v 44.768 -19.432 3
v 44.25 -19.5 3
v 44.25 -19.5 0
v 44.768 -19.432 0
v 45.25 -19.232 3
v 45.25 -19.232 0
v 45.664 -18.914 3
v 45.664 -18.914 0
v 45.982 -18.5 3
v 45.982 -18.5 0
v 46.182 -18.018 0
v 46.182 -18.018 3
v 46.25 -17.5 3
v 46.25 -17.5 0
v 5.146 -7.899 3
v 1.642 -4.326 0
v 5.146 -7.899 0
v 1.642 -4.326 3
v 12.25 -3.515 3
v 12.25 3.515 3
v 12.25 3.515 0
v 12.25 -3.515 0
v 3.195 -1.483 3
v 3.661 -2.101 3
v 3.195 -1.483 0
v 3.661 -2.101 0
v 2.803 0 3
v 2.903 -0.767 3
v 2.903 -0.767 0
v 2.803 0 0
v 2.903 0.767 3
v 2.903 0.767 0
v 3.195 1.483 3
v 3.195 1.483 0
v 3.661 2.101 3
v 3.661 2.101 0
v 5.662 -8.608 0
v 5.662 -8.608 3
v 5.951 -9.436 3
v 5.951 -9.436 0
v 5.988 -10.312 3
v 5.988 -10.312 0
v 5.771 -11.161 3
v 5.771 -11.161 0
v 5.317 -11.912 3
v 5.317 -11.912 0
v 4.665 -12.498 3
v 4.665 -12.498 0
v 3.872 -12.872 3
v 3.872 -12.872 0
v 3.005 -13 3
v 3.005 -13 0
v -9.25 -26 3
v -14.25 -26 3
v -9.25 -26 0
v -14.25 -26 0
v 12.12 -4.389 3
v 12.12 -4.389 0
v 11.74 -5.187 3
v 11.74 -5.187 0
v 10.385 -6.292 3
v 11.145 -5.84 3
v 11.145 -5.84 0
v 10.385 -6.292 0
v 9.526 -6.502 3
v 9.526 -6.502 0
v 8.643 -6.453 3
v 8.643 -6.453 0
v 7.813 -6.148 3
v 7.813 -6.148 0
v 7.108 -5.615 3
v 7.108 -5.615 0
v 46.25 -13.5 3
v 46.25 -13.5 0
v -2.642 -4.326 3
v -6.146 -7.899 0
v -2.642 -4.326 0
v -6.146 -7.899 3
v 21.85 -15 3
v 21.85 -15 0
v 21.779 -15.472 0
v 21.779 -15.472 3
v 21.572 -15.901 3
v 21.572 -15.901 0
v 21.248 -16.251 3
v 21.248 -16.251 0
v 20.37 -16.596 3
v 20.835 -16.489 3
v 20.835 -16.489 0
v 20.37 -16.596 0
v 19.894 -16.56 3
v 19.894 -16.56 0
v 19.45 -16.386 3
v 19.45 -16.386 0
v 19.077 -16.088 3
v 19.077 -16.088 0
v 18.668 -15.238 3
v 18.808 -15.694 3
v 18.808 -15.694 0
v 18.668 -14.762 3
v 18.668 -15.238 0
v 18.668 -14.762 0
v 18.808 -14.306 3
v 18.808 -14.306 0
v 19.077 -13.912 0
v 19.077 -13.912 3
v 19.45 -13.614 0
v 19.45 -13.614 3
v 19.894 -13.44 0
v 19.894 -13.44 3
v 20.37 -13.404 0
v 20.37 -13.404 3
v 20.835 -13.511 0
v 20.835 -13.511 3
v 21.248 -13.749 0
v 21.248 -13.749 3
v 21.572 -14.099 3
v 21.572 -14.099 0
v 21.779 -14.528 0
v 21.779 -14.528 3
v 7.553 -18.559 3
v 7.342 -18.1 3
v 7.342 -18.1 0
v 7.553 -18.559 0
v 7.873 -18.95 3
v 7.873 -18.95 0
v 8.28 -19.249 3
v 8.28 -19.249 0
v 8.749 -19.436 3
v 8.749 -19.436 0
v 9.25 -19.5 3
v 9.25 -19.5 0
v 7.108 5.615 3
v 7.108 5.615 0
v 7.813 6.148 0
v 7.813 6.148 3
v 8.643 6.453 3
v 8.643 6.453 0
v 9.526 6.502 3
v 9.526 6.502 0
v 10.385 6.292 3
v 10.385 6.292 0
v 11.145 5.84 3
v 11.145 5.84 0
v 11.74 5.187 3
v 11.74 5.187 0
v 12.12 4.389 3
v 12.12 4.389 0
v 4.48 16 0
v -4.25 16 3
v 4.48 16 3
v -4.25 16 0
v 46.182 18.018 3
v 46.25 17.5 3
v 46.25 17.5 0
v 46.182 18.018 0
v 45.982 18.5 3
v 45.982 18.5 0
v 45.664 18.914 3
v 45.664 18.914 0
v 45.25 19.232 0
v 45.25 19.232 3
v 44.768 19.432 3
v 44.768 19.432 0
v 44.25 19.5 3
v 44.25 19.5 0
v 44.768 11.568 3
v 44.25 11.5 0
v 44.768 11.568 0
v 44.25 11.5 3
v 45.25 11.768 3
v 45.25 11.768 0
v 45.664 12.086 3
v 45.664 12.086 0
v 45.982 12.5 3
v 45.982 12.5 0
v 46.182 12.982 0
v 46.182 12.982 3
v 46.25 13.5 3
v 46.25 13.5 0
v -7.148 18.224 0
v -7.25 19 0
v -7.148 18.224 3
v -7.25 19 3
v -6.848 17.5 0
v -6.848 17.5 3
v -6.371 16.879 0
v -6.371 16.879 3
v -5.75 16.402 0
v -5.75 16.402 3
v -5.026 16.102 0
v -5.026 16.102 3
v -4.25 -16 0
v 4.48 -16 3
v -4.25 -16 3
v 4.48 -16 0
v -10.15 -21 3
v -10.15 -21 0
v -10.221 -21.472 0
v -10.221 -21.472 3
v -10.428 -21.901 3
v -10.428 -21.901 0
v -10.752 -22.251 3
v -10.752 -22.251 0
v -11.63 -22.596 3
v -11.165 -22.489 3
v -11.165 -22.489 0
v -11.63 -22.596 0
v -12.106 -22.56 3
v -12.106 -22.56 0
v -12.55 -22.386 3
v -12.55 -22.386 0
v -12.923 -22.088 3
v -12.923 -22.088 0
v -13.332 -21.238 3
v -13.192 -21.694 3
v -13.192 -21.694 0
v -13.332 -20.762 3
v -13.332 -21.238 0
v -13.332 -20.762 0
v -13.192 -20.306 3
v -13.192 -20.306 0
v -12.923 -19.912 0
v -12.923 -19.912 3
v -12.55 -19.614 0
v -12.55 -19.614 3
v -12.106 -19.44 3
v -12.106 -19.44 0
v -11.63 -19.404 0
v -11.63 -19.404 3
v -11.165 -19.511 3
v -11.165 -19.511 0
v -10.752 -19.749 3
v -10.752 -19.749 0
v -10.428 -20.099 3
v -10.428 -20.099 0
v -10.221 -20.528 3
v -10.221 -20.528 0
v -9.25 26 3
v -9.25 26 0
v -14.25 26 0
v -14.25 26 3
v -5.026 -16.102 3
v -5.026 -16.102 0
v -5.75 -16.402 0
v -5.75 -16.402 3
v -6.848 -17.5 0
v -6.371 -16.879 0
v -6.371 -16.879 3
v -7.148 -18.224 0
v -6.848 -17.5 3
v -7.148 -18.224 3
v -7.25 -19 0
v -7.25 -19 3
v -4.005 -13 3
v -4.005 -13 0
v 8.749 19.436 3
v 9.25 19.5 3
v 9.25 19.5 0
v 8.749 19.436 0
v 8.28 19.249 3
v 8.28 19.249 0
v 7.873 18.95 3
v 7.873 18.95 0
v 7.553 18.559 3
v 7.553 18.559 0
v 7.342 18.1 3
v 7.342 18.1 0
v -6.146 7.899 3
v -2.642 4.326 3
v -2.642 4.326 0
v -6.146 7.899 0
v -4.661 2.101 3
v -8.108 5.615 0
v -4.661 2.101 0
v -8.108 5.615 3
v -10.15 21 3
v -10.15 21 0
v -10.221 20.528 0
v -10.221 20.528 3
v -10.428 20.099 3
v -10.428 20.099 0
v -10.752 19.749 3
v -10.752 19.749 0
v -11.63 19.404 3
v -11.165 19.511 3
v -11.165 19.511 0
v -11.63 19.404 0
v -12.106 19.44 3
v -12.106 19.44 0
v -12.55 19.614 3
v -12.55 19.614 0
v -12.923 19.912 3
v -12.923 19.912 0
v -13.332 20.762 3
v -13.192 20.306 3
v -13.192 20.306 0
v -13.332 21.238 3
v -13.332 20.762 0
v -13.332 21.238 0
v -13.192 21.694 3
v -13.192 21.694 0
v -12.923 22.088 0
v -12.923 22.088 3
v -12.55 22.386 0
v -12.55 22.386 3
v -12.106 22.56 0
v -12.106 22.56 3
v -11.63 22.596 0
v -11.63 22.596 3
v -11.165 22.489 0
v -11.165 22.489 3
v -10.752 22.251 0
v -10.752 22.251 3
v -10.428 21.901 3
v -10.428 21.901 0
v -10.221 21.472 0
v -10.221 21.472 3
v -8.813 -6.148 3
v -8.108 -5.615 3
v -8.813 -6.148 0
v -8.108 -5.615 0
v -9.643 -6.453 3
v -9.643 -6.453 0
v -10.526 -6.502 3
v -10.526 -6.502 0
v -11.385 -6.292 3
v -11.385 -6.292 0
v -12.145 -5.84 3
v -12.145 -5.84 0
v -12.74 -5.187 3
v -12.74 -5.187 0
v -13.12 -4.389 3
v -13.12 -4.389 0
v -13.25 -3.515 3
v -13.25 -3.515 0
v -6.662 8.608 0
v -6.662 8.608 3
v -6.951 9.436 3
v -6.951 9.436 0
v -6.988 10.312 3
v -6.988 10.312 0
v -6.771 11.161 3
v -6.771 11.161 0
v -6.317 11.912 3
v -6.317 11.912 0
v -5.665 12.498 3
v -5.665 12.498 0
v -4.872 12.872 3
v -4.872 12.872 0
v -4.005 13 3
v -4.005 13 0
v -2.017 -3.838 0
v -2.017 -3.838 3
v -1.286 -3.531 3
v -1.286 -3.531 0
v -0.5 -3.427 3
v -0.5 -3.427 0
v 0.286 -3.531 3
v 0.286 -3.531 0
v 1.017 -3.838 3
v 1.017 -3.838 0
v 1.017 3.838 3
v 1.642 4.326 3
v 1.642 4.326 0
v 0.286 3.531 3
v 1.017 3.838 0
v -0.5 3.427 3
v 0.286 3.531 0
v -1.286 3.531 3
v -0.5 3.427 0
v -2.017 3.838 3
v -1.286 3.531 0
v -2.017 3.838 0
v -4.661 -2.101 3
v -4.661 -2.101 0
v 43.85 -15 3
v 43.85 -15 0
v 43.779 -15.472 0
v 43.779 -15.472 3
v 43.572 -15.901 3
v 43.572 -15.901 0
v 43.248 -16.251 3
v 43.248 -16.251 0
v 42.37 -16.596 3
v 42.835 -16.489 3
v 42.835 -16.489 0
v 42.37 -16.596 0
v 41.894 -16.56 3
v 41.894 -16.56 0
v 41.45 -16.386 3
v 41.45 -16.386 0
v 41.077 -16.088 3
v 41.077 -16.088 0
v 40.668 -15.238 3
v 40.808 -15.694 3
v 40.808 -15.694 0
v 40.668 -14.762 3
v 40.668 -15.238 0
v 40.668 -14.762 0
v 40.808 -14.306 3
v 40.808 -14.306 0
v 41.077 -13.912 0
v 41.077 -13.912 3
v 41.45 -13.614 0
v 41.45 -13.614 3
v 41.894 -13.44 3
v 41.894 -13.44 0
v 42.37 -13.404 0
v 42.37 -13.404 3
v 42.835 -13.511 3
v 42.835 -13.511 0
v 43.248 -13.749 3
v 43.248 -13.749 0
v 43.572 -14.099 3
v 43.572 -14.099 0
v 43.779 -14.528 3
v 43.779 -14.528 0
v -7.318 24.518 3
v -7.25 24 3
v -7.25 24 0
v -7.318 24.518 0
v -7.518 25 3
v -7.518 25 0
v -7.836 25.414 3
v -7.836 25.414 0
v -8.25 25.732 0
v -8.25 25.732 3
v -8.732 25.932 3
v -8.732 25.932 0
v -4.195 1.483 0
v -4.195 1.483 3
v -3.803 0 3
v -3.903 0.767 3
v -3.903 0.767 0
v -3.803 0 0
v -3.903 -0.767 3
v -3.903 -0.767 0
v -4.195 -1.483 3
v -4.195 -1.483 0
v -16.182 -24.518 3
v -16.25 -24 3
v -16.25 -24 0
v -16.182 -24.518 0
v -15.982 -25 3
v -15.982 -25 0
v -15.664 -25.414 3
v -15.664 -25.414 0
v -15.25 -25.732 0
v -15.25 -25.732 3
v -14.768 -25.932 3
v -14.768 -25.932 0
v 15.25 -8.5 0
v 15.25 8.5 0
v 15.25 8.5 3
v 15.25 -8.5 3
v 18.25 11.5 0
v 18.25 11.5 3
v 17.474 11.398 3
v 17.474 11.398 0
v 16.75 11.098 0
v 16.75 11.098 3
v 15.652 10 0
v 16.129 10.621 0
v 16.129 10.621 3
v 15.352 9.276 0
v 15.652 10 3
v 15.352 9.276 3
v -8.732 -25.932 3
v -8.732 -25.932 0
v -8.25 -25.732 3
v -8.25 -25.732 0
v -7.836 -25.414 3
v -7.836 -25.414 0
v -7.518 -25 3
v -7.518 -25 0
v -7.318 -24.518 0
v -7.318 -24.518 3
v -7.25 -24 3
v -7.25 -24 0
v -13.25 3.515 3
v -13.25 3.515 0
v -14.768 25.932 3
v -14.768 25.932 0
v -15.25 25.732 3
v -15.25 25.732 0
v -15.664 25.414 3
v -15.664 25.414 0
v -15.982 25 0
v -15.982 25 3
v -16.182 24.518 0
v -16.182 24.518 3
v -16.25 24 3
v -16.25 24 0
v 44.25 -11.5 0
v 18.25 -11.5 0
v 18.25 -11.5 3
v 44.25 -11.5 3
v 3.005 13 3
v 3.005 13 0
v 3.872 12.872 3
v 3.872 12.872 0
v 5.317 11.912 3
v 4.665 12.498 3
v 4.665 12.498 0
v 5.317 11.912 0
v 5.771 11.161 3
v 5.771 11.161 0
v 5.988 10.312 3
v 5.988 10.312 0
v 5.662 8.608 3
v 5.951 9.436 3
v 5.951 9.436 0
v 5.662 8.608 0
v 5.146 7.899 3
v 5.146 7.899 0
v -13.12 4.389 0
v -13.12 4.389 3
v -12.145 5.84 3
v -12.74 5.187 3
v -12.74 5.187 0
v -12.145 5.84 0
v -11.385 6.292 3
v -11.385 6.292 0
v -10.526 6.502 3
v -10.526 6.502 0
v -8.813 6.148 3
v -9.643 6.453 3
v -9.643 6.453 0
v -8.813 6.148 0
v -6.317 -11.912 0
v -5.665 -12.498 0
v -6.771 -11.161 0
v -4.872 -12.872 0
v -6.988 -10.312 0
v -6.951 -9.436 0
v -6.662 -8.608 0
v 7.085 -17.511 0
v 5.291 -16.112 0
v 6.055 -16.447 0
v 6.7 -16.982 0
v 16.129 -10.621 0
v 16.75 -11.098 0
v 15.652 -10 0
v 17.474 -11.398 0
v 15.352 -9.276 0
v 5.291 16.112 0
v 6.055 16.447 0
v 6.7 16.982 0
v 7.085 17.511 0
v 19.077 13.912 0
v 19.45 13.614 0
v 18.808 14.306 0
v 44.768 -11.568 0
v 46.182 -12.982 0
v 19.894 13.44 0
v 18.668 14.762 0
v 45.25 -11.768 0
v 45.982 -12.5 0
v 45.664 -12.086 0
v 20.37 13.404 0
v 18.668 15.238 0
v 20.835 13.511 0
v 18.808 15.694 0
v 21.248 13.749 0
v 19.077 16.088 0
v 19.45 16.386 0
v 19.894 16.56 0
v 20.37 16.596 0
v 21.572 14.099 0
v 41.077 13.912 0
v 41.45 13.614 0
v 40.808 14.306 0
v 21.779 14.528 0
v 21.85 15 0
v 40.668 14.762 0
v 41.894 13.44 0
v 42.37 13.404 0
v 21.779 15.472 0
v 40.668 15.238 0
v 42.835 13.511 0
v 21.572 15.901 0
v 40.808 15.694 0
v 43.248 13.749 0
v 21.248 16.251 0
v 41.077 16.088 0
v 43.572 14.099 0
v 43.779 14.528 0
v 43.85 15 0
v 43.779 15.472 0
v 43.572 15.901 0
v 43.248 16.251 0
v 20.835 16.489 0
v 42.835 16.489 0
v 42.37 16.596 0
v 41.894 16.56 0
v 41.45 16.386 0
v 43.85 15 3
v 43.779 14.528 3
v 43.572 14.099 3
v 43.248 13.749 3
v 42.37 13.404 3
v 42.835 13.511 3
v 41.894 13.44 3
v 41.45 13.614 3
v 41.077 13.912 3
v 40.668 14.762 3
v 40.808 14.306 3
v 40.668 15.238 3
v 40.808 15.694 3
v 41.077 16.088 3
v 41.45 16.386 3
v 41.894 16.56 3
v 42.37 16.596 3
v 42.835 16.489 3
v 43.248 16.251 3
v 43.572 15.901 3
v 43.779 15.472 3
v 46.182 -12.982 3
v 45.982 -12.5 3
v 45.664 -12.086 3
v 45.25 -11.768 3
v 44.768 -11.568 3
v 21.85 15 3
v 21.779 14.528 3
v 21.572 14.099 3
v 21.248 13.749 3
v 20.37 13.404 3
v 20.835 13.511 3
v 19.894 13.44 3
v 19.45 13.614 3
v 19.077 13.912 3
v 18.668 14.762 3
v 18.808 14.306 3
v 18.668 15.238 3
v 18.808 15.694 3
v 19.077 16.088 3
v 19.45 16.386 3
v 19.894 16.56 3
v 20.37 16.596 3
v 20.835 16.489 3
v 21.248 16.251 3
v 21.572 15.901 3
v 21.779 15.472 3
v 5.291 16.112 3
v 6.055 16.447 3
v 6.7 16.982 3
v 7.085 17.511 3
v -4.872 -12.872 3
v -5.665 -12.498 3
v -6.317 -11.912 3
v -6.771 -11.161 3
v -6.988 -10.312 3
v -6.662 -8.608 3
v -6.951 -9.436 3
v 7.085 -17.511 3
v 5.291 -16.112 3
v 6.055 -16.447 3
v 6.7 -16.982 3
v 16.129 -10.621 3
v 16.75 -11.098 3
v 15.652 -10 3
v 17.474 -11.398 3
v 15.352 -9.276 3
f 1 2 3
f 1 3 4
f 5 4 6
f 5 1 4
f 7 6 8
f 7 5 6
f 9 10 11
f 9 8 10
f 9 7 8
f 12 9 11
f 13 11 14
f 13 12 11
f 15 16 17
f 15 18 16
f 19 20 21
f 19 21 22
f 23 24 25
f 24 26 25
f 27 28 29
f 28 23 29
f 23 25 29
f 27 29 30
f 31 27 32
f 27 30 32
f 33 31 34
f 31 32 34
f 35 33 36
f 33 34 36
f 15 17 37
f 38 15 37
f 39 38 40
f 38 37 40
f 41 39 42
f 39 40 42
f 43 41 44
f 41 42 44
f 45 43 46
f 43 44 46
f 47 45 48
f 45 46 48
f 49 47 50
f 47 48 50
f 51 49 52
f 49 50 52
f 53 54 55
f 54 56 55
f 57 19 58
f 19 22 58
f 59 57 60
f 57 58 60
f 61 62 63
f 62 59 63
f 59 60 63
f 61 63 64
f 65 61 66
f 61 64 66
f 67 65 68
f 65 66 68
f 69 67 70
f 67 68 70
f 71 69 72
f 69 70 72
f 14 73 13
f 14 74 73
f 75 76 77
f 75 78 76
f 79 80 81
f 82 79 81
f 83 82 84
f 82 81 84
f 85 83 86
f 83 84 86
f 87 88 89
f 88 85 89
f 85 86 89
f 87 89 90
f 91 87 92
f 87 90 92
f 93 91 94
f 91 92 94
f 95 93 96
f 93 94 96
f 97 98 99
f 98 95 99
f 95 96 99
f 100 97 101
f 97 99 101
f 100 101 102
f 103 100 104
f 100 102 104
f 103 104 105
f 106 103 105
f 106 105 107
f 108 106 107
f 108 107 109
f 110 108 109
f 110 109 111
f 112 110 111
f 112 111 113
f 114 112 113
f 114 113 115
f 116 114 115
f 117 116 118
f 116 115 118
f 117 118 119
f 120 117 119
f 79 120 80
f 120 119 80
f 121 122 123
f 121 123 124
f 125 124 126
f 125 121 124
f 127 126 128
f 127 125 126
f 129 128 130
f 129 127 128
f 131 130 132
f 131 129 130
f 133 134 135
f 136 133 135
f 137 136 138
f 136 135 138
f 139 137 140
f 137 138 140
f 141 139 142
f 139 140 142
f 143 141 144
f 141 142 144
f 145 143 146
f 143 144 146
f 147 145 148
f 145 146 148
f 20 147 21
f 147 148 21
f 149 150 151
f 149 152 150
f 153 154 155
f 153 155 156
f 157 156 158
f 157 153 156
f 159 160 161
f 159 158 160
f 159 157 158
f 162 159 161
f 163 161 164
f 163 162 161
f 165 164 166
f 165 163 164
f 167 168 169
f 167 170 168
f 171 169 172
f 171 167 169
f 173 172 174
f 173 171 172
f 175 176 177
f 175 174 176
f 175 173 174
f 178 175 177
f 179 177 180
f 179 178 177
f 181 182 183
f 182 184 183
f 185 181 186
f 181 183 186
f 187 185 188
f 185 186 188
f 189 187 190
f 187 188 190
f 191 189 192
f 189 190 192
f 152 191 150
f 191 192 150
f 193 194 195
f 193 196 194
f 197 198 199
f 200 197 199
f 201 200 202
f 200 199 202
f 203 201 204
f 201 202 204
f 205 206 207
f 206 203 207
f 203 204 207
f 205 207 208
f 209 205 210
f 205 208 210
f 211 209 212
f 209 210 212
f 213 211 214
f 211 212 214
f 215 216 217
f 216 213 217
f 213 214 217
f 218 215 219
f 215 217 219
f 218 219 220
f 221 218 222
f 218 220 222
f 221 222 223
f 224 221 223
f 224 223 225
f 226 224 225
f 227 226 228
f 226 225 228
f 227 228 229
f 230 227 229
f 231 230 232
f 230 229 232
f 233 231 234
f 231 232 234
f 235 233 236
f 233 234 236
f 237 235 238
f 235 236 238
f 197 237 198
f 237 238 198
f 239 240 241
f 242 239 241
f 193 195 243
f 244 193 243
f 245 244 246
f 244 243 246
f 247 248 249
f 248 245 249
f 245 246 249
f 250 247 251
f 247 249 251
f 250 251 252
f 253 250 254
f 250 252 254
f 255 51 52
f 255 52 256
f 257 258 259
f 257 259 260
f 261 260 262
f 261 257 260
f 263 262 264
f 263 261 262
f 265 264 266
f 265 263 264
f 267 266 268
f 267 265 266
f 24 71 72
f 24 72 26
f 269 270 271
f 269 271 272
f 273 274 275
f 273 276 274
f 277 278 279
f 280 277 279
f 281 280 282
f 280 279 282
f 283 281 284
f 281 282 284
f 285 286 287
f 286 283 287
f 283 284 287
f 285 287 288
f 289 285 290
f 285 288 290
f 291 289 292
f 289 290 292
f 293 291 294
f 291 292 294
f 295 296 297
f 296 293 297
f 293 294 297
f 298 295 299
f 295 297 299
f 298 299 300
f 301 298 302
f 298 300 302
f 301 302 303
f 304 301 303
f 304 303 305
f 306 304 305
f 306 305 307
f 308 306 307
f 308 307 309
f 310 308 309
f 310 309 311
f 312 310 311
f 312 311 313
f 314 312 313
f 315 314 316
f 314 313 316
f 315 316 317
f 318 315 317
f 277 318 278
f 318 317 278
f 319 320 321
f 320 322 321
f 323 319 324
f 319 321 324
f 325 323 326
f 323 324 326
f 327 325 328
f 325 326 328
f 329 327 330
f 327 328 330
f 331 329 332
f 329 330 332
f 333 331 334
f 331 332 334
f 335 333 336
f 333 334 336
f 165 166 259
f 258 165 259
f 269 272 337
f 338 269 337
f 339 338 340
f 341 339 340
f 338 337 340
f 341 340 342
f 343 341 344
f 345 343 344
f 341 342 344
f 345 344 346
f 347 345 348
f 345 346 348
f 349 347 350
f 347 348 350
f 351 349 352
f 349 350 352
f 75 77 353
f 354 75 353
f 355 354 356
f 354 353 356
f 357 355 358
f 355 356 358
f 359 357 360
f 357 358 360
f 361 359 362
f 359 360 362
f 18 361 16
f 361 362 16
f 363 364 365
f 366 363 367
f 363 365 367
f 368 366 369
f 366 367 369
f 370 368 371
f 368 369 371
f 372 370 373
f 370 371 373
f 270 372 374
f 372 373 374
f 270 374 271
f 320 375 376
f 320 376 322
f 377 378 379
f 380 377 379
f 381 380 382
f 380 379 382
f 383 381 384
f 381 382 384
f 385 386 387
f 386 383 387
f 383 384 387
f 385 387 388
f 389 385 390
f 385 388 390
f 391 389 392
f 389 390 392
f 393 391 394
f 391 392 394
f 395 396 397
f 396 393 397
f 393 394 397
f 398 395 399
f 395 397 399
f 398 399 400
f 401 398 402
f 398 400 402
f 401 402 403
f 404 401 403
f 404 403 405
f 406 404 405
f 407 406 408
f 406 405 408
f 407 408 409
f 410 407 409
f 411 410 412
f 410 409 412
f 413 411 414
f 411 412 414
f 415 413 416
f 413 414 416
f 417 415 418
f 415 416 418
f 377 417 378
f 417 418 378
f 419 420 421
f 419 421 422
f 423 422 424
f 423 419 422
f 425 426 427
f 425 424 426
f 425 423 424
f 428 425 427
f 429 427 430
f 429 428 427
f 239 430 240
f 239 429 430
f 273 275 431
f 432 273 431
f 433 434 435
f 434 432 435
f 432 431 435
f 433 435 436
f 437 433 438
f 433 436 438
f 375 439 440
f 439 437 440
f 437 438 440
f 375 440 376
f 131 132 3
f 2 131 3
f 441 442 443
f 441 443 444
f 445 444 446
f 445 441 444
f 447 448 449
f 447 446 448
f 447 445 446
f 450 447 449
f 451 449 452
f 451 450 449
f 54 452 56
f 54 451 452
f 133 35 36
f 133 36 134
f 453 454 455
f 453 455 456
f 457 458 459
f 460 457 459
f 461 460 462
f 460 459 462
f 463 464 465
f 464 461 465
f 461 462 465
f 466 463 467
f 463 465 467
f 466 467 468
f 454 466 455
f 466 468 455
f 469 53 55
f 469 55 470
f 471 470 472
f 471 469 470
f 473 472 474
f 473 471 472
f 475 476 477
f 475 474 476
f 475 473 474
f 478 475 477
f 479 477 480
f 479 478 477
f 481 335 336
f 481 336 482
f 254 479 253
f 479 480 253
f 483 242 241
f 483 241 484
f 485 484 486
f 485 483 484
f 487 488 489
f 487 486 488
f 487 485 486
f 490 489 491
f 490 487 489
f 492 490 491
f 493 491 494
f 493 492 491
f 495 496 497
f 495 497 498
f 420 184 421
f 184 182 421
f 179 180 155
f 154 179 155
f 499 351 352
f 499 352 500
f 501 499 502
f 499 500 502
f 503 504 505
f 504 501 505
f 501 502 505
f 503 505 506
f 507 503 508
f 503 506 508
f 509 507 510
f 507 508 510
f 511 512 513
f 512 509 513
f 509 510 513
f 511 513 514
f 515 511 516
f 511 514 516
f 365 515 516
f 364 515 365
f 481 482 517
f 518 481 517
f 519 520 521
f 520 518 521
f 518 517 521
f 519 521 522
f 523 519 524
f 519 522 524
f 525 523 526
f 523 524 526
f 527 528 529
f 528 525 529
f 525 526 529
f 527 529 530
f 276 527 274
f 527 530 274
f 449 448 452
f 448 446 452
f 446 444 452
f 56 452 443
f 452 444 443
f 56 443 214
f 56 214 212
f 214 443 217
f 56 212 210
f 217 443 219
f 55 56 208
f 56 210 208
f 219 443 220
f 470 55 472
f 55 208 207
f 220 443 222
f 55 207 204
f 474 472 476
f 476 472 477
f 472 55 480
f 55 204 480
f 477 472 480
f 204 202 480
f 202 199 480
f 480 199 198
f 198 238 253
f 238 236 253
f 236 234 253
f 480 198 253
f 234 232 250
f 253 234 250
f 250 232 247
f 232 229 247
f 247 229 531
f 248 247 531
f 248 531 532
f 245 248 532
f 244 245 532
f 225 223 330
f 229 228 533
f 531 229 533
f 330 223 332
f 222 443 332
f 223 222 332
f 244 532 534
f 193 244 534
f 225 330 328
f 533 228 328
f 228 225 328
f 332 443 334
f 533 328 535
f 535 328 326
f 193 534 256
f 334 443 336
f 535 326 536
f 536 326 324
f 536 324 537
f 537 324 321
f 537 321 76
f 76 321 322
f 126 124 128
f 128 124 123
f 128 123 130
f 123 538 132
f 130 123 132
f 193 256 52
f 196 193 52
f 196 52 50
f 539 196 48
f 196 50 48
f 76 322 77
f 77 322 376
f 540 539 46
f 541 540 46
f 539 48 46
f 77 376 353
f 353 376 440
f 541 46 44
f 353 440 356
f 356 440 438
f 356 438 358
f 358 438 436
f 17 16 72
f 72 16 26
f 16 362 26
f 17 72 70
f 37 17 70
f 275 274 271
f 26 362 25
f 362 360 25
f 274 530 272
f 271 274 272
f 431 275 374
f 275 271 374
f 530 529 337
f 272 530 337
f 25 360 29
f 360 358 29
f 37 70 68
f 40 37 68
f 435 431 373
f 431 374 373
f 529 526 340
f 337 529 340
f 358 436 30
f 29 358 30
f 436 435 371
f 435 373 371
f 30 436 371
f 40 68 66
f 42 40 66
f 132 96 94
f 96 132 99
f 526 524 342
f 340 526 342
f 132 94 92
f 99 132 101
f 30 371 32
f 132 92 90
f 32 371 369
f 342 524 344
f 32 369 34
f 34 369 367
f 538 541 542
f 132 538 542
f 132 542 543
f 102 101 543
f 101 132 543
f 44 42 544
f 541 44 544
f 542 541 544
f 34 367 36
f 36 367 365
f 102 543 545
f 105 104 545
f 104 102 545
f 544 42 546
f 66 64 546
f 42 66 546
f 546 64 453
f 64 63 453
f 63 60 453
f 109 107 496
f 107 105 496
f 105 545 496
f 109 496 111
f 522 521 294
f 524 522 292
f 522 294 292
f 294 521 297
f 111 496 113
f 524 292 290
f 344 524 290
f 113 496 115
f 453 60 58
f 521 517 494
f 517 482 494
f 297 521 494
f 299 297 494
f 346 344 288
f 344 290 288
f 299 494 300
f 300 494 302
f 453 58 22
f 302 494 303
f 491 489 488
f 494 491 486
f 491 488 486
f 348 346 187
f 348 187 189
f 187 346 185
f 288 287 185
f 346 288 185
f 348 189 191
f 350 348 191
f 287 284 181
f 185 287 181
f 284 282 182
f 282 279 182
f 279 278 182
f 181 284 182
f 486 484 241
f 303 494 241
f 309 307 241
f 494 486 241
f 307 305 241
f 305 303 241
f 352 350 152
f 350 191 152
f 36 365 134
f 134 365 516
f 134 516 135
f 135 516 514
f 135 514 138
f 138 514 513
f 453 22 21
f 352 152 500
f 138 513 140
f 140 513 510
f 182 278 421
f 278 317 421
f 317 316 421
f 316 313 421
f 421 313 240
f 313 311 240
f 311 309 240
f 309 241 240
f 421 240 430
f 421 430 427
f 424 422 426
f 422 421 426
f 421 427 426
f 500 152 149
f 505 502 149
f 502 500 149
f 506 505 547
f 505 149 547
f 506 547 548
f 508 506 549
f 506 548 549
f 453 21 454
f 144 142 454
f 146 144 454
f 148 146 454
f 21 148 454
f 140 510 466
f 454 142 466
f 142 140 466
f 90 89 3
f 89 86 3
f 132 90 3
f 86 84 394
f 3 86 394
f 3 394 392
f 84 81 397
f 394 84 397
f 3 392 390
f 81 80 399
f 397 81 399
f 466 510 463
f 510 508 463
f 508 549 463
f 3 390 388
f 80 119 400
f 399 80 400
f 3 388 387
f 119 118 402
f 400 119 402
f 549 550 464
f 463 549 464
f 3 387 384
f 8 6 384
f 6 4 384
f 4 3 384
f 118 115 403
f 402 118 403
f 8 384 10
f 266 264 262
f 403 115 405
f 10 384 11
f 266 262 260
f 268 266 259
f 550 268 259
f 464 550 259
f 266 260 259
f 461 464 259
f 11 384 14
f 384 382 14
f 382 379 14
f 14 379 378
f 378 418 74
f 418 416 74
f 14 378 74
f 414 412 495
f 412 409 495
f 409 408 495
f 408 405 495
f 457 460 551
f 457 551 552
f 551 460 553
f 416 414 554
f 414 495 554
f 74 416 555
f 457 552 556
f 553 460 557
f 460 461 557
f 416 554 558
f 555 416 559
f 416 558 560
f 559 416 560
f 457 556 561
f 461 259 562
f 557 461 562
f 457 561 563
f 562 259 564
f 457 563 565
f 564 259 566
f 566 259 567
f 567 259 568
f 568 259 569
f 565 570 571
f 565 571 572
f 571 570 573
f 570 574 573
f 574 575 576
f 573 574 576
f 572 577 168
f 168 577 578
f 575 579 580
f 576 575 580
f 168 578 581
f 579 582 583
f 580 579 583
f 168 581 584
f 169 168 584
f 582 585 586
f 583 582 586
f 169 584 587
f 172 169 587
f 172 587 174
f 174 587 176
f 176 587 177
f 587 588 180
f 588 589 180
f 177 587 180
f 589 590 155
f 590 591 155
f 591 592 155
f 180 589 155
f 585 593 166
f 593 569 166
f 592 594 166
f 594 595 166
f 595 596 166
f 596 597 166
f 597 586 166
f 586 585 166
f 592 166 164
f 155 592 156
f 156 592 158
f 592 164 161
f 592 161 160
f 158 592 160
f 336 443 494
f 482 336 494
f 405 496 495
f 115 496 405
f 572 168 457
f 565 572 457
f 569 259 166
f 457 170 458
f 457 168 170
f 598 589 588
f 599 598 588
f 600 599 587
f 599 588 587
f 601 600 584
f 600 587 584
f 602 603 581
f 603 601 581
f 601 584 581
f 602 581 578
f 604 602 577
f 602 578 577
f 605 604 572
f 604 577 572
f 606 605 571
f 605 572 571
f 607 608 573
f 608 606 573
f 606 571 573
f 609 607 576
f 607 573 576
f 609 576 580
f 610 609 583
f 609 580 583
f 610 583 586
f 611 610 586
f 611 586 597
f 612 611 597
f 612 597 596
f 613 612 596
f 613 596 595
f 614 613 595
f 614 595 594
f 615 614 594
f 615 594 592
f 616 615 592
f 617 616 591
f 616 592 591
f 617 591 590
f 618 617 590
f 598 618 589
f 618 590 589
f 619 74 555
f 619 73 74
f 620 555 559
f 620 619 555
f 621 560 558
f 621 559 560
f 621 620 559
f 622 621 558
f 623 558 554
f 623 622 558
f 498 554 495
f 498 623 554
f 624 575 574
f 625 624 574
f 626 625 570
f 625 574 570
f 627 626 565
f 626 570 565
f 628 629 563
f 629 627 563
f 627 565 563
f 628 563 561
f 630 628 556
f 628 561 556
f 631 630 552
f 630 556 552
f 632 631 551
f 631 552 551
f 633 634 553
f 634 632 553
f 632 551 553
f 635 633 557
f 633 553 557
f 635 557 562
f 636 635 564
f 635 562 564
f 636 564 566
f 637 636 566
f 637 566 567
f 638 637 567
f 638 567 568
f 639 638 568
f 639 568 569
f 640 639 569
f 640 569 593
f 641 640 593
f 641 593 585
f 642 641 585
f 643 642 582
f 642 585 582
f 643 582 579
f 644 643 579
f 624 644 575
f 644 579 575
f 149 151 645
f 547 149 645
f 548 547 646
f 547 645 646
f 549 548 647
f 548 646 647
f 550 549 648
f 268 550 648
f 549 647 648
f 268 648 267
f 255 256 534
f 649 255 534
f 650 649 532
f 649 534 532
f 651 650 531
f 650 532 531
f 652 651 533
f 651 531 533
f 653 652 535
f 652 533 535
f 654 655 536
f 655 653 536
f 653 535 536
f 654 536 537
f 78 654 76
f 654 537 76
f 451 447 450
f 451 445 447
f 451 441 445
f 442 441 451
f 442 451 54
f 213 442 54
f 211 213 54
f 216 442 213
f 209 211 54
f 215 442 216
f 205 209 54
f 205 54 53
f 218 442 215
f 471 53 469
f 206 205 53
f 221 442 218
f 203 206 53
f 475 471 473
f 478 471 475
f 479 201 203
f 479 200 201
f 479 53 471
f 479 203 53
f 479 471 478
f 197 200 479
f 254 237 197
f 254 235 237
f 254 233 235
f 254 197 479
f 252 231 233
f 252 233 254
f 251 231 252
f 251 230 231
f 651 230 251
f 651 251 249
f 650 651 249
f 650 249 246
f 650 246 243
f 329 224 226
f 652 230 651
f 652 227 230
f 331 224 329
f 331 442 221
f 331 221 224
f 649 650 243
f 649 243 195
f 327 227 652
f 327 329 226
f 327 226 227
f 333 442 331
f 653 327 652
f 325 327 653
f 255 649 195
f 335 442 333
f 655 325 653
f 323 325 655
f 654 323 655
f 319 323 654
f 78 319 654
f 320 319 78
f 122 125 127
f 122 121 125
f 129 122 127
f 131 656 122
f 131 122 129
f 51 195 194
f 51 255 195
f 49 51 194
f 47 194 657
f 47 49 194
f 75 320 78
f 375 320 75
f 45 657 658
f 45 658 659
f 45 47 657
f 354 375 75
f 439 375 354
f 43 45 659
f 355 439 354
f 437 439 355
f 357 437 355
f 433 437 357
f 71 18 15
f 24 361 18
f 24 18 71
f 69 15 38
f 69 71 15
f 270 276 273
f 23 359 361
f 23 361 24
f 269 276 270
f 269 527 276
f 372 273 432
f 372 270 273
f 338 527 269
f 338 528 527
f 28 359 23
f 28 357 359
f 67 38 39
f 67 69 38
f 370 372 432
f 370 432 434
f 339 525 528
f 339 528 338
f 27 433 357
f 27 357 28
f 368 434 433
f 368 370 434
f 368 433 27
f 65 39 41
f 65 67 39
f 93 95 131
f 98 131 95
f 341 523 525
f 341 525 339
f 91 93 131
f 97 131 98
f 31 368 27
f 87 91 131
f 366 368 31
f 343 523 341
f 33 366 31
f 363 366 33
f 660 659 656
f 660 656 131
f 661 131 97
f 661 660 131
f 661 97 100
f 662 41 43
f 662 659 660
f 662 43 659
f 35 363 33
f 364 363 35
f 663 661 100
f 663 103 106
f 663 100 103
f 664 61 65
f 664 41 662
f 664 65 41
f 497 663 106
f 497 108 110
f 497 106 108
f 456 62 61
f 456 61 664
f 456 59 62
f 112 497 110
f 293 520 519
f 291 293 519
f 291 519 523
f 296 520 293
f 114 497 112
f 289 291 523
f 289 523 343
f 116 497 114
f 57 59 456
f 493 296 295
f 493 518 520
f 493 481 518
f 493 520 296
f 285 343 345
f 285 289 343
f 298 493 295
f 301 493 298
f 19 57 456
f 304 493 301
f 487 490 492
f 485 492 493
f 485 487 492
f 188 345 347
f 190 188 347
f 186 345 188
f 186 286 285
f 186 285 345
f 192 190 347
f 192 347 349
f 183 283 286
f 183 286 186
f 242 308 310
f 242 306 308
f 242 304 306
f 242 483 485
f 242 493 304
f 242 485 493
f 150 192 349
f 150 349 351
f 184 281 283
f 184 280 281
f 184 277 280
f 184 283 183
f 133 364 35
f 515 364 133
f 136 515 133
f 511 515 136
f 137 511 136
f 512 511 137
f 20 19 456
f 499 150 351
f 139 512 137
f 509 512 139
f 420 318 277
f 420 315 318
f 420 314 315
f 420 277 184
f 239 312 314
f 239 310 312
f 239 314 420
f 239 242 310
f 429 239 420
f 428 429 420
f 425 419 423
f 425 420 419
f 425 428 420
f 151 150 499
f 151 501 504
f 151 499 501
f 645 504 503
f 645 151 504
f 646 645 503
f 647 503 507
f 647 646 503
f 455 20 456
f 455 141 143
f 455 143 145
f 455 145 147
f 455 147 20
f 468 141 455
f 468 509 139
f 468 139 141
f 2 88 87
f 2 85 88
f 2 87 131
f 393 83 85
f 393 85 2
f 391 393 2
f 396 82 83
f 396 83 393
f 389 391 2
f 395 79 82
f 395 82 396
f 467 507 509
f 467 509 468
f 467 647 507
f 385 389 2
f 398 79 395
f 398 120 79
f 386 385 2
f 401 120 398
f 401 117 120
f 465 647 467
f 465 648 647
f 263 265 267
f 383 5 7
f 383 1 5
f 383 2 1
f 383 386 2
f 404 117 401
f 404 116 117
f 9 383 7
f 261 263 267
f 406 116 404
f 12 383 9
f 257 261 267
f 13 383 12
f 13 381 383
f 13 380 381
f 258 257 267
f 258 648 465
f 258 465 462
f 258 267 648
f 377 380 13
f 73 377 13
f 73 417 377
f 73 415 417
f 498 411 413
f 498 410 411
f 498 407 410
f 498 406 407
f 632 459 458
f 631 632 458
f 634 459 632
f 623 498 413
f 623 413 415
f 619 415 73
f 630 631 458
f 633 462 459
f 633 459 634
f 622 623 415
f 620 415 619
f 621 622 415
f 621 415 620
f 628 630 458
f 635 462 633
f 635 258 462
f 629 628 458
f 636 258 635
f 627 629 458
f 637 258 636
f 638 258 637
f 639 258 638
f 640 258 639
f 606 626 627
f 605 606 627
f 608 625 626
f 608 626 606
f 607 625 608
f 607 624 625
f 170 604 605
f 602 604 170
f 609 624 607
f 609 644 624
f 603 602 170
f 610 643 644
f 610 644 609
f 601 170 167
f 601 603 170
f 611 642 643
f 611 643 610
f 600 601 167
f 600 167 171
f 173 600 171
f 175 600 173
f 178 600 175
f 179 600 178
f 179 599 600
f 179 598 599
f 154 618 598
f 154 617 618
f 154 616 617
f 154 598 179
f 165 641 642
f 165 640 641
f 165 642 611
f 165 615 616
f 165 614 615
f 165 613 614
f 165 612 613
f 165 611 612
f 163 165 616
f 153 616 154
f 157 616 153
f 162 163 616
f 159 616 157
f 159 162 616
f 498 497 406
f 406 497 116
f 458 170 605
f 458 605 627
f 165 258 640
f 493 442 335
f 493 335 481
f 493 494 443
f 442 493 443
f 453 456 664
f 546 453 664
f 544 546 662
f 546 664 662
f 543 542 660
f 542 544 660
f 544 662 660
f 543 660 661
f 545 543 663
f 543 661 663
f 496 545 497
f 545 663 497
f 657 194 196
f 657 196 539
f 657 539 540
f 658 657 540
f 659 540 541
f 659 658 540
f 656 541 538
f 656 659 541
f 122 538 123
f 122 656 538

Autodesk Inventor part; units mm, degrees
ref_plane "YZ Plane" through (0, 0, 0) normal (1, 0, 0) x (0, 1, 0)
ref_plane "XZ Plane" through (0, 0, 0) normal (0, 1, 0) x (-1, 0, 0)
ref_plane "XY Plane" through (0, 0, 0) normal (0, 0, 1) x (1, 0, 0)
sketch "スケッチ1" plane through (0, 0, 0) normal (0, 0, 1) x (1, 0, 0)
  line L0 (7.25, -16) -> (-7.25, -16)
  line L1 (-16.25, -16) -> (-16.25, 16)
  line L2 (-7.25, 16) -> (7.25, 16)
  line L3 (16.25, -16) -> (-16.25, 16) construction
  line L4 (-16.25, -16) -> (16.25, 16) construction
  line L5 (16.25, 0) -> (46.25, 0) construction
  line L6 (46.25, -10.5) -> (16.25, -10.5) construction
  line L7 (16.25, 10.5) -> (46.25, 10.5) construction
  line L8 (46.25, 10.5) -> (46.25, -10.5) construction
  line L9 (46.25, -10.5) -> (16.25, 10.5) construction
  line L10 (16.25, -10.5) -> (46.25, 10.5) construction
  line L11 (46.25, 11.5) -> (15.25, 11.5)
  line L12 (15.25, 11.5) -> (15.25, -11.5)
  line L13 (15.25, -11.5) -> (46.25, -11.5)
  line L14 (46.25, 19.5) -> (7.25, 19.5)
  line L15 (7.25, -19.5) -> (46.25, -19.5)
  line L16 (46.25, 11.5) -> (46.25, 19.5)
  line L17 (46.25, -11.5) -> (46.25, -19.5)
  line L18 (16.25, 10.5) -> (16.25, -10.5) construction
  line L19 (7.25, 19.5) -> (7.25, 16)
  line L20 (7.25, -16) -> (7.25, -19.5)
  line L21 (-16.25, -16) -> (-16.25, -26)
  line L22 (-16.25, -26) -> (-7.25, -26)
  line L23 (-7.25, 26) -> (-16.25, 26)
  line L24 (-16.25, 26) -> (-16.25, 16)
  line L25 (-11.75, 26) -> (-11.75, -26) construction
  line L26 (-11.75, 0) -> (-16.25, 0) construction
  circle A0 centre (-11.75, -21) radius 1.6
  line L27 (-7.25, -26) -> (-7.25, -16)
  line L28 (-7.25, 16) -> (-7.25, 26)
  circle A1 centre (-11.75, 21) radius 1.6
  line L29 (46.25, 10.5) -> (16.25, 10.5) construction
  line L30 (31.25, 10.5) -> (31.25, 19.5) construction
  line L31 (31.25, 15) -> (46.25, 15) construction
  circle A2 centre (37.05, 15) radius 1.6 construction
  circle A3 centre (42.25, 15) radius 1.6
  circle A4 centre (25.45, 15) radius 1.6 construction
  circle A5 centre (20.25, 15) radius 1.6
  circle A6 centre (37.05, -15) radius 1.6 construction
  circle A7 centre (42.25, -15) radius 1.6
  circle A8 centre (25.45, -15) radius 1.6 construction
  circle A9 centre (20.25, -15) radius 1.6
  point P0 (0, 0)
  point P1 (31.25, 0)
  dimension "d21" = 32.5
  dimension "d22" = 32
  dimension "d24" = 30
  dimension "d25" = 21
  dimension "d26" = 1
  dimension "d28" = 30
  dimension "d30" = 9
  dimension "d32" = 9
  dimension "d33" = 3.2
  dimension "d34" = 5
  dimension "d35" = 10
  dimension "d36" = 8
  dimension "d37" = 31
  dimension "d38" = 3.5
  dimension "d39" = 35.5
  dimension "d40" = 9
  dimension "d41" = 3.2
  dimension "d42" = 3.2
  dimension "d43" = 4
  dimension "d44" = 31
  dimension "d46" = 2
extrude "押し出し1" add sketch "スケッチ1" along normal blind 3
fillet "フィレット1" radius 2 10 edges at (7.25, 19.5, 1.5) (-7.25, 26, 1.5) (-16.25, 26, 1.5) (46.25, 19.5, 1.5) (46.25, 11.5, 1.5) (46.25, -11.5, 1.5) (46.25, -19.5, 1.5) (7.25, -19.5, 1.5) (-7.25, -26, 1.5) (-16.25, -26, 1.5)
fillet "フィレット2" radius 3 6 edges at (15.25, -11.5, 1.5) (15.25, 11.5, 1.5) (7.25, 16, 1.5) (7.25, -16, 1.5) (-7.25, -16, 1.5) (-7.25, 16, 1.5)
sketch "スケッチ2" plane through (0, 0, 3) normal (0, 0, 1) x (1, 0, 0)
  arc A0 (-16.25, -24) -> (-14.25, -26) centre (-14.25, -24) ccw projected
  line L0 (-14.25, -26) -> (-9.25, -26) projected
  arc A1 (-9.25, -26) -> (-7.25, -24) centre (-9.25, -24) ccw projected
  line L1 (-7.25, -24) -> (-7.25, -19) projected
  arc A2 (-4.25, -16) -> (-7.25, -19) centre (-4.25, -19) ccw projected
  line L2 (-4.25, -16) -> (4.4803, -16) projected
  arc A3 (7.3421, -18.1) -> (4.4803, -16) centre (4.4803, -19) ccw projected
  arc A4 (7.3421, -18.1) -> (9.25, -19.5) centre (9.25, -17.5) ccw projected
  line L3 (9.25, -19.5) -> (44.25, -19.5) projected
  arc A5 (44.25, -19.5) -> (46.25, -17.5) centre (44.25, -17.5) ccw projected
  line L4 (46.25, -17.5) -> (46.25, -13.5) projected
  arc A6 (46.25, -13.5) -> (44.25, -11.5) centre (44.25, -13.5) ccw projected
  line L5 (44.25, -11.5) -> (18.25, -11.5) projected
  arc A7 (15.25, -8.5) -> (18.25, -11.5) centre (18.25, -8.5) ccw projected
  line L6 (15.25, -8.5) -> (15.25, 8.5) projected
  arc A8 (18.25, 11.5) -> (15.25, 8.5) centre (18.25, 8.5) ccw projected
  line L7 (18.25, 11.5) -> (44.25, 11.5) projected
  arc A9 (44.25, 11.5) -> (46.25, 13.5) centre (44.25, 13.5) ccw projected
  line L8 (46.25, 13.5) -> (46.25, 17.5) projected
  arc A10 (46.25, 17.5) -> (44.25, 19.5) centre (44.25, 17.5) ccw projected
  line L9 (44.25, 19.5) -> (9.25, 19.5) projected
  arc A11 (9.25, 19.5) -> (7.3421, 18.1) centre (9.25, 17.5) ccw projected
  arc A12 (4.4803, 16) -> (7.3421, 18.1) centre (4.4803, 19) ccw projected
  line L10 (4.4803, 16) -> (-4.25, 16) projected
  arc A13 (-7.25, 19) -> (-4.25, 16) centre (-4.25, 19) ccw projected
  line L11 (-7.25, 19) -> (-7.25, 24) projected
  arc A14 (-7.25, 24) -> (-9.25, 26) centre (-9.25, 24) ccw projected
  line L12 (-9.25, 26) -> (-14.25, 26) projected
  arc A15 (-14.25, 26) -> (-16.25, 24) centre (-14.25, 24) ccw projected
  line L13 (-16.25, 24) -> (-16.25, -24) projected
  circle A16 centre (42.25, -15) radius 1.6 projected
  circle A17 centre (20.25, -15) radius 1.6 projected
  circle A18 centre (20.25, 15) radius 1.6 projected
  circle A19 centre (42.25, 15) radius 1.6 projected
  circle A20 centre (-11.75, 21) radius 1.6 projected
  circle A21 centre (-11.75, -21) radius 1.6 projected
  circle A22 centre (-11.75, 21) radius 4.6
  circle A23 centre (-11.75, -21) radius 4.6
  line L14 (4.4803, -13) -> (-4.25, -13)
  arc A24 (-9.8384, -16.816) -> (-10.25, -19) centre (-4.25, -19) ccw
  line L15 (-10.25, -19) -> (-10.25, -23)
  line L16 (-10.25, -23) -> (-13.25, -23)
  line L17 (-13.25, 23) -> (-10.25, 23)
  line L18 (-10.25, 23) -> (-10.25, 19)
  arc A25 (-10.25, 19) -> (-9.8384, 16.816) centre (-4.25, 19) ccw
  line L19 (-4.25, 13) -> (4.4803, 13)
  line L20 (9.9347, 16.5) -> (43.25, 16.5)
  line L21 (43.25, 16.5) -> (43.25, 14.5)
  line L22 (43.25, 14.5) -> (18.25, 14.5)
  line L23 (12.25, 8.5) -> (12.25, -8.5)
  arc A26 (14.6318, -13.2863) -> (18.25, -14.5) centre (18.25, -8.5) ccw
  line L24 (18.25, -14.5) -> (43.25, -14.5)
  line L25 (43.25, -14.5) -> (43.25, -16.5)
  line L26 (43.25, -16.5) -> (9.9347, -16.5)
  circle A27 centre (20.25, 15) radius 4.6
  line L27 (-4.25, 13) -> (-11.149, 13)
  line L28 (-4.25, -13) -> (-11.149, -13)
  line L29 (12.25, -8.5) -> (12.25, -10.8578)
  line L30 (12.25, 8.5) -> (12.25, 10.8578)
  line L31 (-13.25, 13) -> (12.25, -13) construction
  line L32 (12.25, 13) -> (-13.25, -13) construction
  line L33 (-13.25, 14.5) -> (-13.25, 23)
  line L34 (4.4803, 13) -> (10.149, 13)
  arc A28 (18.25, 14.5) -> (15.7685, 13.9628) centre (18.25, 8.5) ccw
  line L35 (-13.25, -23) -> (-13.25, -16.6514)
  line L36 (-13.25, -10.8578) -> (-13.25, 10.8578)
  line L37 (10.149, 13) -> (-0.5, 2.1422)
  line L38 (-2.601, 0) -> (-13.25, -10.8578)
  line L39 (-11.149, -13) -> (-0.5, -2.1422)
  line L40 (1.601, 0) -> (12.25, 10.8578)
  line L41 (-13.25, 10.8578) -> (-2.601, 0)
  line L42 (-0.5, -2.1422) -> (10.149, -13)
  line L43 (12.25, -10.8578) -> (1.601, 0)
  line L44 (-0.5, 2.1422) -> (-11.149, 13)
  line L45 (4.4803, -13) -> (10.149, -13)
  arc A29 (9.9347, -16.5) -> (9.3557, -15.5028) centre (4.4803, -19) ccw
  point P0 (0, 0)
  point P1 (-0.5, 0)
  point P2 (-0.5, 0)
  dimension "d51" = 3
  dimension "d52" = 3
  dimension "d53" = 3
  dimension "d54" = 3
extrude "押し出し2" cut sketch "スケッチ2" against normal through all contours L14 L28 L39 L42 L45 | L19 L34 L37 L44 L27 | L23 L29 L43 L40 L30 | L36 L41 L38
fillet "フィレット3" radius 3 12 edges at (-11.149, 13, 1.5) (10.149, 13, 1.5) (-0.5, 2.1422, 1.5) (-13.25, 10.8578, 1.5) (-13.25, -10.8578, 1.5) (-2.601, 0, 1.5) (-0.5, -2.1422, 1.5) (-11.149, -13, 1.5) (10.149, -13, 1.5) (1.601, 0, 1.5) (12.25, 10.8578, 1.5) (12.25, -10.8578, 1.5)
properties part number "肩ピッチ固定板_アルミ(A2017)_t3" material "アルミニウム 2014-T6"
